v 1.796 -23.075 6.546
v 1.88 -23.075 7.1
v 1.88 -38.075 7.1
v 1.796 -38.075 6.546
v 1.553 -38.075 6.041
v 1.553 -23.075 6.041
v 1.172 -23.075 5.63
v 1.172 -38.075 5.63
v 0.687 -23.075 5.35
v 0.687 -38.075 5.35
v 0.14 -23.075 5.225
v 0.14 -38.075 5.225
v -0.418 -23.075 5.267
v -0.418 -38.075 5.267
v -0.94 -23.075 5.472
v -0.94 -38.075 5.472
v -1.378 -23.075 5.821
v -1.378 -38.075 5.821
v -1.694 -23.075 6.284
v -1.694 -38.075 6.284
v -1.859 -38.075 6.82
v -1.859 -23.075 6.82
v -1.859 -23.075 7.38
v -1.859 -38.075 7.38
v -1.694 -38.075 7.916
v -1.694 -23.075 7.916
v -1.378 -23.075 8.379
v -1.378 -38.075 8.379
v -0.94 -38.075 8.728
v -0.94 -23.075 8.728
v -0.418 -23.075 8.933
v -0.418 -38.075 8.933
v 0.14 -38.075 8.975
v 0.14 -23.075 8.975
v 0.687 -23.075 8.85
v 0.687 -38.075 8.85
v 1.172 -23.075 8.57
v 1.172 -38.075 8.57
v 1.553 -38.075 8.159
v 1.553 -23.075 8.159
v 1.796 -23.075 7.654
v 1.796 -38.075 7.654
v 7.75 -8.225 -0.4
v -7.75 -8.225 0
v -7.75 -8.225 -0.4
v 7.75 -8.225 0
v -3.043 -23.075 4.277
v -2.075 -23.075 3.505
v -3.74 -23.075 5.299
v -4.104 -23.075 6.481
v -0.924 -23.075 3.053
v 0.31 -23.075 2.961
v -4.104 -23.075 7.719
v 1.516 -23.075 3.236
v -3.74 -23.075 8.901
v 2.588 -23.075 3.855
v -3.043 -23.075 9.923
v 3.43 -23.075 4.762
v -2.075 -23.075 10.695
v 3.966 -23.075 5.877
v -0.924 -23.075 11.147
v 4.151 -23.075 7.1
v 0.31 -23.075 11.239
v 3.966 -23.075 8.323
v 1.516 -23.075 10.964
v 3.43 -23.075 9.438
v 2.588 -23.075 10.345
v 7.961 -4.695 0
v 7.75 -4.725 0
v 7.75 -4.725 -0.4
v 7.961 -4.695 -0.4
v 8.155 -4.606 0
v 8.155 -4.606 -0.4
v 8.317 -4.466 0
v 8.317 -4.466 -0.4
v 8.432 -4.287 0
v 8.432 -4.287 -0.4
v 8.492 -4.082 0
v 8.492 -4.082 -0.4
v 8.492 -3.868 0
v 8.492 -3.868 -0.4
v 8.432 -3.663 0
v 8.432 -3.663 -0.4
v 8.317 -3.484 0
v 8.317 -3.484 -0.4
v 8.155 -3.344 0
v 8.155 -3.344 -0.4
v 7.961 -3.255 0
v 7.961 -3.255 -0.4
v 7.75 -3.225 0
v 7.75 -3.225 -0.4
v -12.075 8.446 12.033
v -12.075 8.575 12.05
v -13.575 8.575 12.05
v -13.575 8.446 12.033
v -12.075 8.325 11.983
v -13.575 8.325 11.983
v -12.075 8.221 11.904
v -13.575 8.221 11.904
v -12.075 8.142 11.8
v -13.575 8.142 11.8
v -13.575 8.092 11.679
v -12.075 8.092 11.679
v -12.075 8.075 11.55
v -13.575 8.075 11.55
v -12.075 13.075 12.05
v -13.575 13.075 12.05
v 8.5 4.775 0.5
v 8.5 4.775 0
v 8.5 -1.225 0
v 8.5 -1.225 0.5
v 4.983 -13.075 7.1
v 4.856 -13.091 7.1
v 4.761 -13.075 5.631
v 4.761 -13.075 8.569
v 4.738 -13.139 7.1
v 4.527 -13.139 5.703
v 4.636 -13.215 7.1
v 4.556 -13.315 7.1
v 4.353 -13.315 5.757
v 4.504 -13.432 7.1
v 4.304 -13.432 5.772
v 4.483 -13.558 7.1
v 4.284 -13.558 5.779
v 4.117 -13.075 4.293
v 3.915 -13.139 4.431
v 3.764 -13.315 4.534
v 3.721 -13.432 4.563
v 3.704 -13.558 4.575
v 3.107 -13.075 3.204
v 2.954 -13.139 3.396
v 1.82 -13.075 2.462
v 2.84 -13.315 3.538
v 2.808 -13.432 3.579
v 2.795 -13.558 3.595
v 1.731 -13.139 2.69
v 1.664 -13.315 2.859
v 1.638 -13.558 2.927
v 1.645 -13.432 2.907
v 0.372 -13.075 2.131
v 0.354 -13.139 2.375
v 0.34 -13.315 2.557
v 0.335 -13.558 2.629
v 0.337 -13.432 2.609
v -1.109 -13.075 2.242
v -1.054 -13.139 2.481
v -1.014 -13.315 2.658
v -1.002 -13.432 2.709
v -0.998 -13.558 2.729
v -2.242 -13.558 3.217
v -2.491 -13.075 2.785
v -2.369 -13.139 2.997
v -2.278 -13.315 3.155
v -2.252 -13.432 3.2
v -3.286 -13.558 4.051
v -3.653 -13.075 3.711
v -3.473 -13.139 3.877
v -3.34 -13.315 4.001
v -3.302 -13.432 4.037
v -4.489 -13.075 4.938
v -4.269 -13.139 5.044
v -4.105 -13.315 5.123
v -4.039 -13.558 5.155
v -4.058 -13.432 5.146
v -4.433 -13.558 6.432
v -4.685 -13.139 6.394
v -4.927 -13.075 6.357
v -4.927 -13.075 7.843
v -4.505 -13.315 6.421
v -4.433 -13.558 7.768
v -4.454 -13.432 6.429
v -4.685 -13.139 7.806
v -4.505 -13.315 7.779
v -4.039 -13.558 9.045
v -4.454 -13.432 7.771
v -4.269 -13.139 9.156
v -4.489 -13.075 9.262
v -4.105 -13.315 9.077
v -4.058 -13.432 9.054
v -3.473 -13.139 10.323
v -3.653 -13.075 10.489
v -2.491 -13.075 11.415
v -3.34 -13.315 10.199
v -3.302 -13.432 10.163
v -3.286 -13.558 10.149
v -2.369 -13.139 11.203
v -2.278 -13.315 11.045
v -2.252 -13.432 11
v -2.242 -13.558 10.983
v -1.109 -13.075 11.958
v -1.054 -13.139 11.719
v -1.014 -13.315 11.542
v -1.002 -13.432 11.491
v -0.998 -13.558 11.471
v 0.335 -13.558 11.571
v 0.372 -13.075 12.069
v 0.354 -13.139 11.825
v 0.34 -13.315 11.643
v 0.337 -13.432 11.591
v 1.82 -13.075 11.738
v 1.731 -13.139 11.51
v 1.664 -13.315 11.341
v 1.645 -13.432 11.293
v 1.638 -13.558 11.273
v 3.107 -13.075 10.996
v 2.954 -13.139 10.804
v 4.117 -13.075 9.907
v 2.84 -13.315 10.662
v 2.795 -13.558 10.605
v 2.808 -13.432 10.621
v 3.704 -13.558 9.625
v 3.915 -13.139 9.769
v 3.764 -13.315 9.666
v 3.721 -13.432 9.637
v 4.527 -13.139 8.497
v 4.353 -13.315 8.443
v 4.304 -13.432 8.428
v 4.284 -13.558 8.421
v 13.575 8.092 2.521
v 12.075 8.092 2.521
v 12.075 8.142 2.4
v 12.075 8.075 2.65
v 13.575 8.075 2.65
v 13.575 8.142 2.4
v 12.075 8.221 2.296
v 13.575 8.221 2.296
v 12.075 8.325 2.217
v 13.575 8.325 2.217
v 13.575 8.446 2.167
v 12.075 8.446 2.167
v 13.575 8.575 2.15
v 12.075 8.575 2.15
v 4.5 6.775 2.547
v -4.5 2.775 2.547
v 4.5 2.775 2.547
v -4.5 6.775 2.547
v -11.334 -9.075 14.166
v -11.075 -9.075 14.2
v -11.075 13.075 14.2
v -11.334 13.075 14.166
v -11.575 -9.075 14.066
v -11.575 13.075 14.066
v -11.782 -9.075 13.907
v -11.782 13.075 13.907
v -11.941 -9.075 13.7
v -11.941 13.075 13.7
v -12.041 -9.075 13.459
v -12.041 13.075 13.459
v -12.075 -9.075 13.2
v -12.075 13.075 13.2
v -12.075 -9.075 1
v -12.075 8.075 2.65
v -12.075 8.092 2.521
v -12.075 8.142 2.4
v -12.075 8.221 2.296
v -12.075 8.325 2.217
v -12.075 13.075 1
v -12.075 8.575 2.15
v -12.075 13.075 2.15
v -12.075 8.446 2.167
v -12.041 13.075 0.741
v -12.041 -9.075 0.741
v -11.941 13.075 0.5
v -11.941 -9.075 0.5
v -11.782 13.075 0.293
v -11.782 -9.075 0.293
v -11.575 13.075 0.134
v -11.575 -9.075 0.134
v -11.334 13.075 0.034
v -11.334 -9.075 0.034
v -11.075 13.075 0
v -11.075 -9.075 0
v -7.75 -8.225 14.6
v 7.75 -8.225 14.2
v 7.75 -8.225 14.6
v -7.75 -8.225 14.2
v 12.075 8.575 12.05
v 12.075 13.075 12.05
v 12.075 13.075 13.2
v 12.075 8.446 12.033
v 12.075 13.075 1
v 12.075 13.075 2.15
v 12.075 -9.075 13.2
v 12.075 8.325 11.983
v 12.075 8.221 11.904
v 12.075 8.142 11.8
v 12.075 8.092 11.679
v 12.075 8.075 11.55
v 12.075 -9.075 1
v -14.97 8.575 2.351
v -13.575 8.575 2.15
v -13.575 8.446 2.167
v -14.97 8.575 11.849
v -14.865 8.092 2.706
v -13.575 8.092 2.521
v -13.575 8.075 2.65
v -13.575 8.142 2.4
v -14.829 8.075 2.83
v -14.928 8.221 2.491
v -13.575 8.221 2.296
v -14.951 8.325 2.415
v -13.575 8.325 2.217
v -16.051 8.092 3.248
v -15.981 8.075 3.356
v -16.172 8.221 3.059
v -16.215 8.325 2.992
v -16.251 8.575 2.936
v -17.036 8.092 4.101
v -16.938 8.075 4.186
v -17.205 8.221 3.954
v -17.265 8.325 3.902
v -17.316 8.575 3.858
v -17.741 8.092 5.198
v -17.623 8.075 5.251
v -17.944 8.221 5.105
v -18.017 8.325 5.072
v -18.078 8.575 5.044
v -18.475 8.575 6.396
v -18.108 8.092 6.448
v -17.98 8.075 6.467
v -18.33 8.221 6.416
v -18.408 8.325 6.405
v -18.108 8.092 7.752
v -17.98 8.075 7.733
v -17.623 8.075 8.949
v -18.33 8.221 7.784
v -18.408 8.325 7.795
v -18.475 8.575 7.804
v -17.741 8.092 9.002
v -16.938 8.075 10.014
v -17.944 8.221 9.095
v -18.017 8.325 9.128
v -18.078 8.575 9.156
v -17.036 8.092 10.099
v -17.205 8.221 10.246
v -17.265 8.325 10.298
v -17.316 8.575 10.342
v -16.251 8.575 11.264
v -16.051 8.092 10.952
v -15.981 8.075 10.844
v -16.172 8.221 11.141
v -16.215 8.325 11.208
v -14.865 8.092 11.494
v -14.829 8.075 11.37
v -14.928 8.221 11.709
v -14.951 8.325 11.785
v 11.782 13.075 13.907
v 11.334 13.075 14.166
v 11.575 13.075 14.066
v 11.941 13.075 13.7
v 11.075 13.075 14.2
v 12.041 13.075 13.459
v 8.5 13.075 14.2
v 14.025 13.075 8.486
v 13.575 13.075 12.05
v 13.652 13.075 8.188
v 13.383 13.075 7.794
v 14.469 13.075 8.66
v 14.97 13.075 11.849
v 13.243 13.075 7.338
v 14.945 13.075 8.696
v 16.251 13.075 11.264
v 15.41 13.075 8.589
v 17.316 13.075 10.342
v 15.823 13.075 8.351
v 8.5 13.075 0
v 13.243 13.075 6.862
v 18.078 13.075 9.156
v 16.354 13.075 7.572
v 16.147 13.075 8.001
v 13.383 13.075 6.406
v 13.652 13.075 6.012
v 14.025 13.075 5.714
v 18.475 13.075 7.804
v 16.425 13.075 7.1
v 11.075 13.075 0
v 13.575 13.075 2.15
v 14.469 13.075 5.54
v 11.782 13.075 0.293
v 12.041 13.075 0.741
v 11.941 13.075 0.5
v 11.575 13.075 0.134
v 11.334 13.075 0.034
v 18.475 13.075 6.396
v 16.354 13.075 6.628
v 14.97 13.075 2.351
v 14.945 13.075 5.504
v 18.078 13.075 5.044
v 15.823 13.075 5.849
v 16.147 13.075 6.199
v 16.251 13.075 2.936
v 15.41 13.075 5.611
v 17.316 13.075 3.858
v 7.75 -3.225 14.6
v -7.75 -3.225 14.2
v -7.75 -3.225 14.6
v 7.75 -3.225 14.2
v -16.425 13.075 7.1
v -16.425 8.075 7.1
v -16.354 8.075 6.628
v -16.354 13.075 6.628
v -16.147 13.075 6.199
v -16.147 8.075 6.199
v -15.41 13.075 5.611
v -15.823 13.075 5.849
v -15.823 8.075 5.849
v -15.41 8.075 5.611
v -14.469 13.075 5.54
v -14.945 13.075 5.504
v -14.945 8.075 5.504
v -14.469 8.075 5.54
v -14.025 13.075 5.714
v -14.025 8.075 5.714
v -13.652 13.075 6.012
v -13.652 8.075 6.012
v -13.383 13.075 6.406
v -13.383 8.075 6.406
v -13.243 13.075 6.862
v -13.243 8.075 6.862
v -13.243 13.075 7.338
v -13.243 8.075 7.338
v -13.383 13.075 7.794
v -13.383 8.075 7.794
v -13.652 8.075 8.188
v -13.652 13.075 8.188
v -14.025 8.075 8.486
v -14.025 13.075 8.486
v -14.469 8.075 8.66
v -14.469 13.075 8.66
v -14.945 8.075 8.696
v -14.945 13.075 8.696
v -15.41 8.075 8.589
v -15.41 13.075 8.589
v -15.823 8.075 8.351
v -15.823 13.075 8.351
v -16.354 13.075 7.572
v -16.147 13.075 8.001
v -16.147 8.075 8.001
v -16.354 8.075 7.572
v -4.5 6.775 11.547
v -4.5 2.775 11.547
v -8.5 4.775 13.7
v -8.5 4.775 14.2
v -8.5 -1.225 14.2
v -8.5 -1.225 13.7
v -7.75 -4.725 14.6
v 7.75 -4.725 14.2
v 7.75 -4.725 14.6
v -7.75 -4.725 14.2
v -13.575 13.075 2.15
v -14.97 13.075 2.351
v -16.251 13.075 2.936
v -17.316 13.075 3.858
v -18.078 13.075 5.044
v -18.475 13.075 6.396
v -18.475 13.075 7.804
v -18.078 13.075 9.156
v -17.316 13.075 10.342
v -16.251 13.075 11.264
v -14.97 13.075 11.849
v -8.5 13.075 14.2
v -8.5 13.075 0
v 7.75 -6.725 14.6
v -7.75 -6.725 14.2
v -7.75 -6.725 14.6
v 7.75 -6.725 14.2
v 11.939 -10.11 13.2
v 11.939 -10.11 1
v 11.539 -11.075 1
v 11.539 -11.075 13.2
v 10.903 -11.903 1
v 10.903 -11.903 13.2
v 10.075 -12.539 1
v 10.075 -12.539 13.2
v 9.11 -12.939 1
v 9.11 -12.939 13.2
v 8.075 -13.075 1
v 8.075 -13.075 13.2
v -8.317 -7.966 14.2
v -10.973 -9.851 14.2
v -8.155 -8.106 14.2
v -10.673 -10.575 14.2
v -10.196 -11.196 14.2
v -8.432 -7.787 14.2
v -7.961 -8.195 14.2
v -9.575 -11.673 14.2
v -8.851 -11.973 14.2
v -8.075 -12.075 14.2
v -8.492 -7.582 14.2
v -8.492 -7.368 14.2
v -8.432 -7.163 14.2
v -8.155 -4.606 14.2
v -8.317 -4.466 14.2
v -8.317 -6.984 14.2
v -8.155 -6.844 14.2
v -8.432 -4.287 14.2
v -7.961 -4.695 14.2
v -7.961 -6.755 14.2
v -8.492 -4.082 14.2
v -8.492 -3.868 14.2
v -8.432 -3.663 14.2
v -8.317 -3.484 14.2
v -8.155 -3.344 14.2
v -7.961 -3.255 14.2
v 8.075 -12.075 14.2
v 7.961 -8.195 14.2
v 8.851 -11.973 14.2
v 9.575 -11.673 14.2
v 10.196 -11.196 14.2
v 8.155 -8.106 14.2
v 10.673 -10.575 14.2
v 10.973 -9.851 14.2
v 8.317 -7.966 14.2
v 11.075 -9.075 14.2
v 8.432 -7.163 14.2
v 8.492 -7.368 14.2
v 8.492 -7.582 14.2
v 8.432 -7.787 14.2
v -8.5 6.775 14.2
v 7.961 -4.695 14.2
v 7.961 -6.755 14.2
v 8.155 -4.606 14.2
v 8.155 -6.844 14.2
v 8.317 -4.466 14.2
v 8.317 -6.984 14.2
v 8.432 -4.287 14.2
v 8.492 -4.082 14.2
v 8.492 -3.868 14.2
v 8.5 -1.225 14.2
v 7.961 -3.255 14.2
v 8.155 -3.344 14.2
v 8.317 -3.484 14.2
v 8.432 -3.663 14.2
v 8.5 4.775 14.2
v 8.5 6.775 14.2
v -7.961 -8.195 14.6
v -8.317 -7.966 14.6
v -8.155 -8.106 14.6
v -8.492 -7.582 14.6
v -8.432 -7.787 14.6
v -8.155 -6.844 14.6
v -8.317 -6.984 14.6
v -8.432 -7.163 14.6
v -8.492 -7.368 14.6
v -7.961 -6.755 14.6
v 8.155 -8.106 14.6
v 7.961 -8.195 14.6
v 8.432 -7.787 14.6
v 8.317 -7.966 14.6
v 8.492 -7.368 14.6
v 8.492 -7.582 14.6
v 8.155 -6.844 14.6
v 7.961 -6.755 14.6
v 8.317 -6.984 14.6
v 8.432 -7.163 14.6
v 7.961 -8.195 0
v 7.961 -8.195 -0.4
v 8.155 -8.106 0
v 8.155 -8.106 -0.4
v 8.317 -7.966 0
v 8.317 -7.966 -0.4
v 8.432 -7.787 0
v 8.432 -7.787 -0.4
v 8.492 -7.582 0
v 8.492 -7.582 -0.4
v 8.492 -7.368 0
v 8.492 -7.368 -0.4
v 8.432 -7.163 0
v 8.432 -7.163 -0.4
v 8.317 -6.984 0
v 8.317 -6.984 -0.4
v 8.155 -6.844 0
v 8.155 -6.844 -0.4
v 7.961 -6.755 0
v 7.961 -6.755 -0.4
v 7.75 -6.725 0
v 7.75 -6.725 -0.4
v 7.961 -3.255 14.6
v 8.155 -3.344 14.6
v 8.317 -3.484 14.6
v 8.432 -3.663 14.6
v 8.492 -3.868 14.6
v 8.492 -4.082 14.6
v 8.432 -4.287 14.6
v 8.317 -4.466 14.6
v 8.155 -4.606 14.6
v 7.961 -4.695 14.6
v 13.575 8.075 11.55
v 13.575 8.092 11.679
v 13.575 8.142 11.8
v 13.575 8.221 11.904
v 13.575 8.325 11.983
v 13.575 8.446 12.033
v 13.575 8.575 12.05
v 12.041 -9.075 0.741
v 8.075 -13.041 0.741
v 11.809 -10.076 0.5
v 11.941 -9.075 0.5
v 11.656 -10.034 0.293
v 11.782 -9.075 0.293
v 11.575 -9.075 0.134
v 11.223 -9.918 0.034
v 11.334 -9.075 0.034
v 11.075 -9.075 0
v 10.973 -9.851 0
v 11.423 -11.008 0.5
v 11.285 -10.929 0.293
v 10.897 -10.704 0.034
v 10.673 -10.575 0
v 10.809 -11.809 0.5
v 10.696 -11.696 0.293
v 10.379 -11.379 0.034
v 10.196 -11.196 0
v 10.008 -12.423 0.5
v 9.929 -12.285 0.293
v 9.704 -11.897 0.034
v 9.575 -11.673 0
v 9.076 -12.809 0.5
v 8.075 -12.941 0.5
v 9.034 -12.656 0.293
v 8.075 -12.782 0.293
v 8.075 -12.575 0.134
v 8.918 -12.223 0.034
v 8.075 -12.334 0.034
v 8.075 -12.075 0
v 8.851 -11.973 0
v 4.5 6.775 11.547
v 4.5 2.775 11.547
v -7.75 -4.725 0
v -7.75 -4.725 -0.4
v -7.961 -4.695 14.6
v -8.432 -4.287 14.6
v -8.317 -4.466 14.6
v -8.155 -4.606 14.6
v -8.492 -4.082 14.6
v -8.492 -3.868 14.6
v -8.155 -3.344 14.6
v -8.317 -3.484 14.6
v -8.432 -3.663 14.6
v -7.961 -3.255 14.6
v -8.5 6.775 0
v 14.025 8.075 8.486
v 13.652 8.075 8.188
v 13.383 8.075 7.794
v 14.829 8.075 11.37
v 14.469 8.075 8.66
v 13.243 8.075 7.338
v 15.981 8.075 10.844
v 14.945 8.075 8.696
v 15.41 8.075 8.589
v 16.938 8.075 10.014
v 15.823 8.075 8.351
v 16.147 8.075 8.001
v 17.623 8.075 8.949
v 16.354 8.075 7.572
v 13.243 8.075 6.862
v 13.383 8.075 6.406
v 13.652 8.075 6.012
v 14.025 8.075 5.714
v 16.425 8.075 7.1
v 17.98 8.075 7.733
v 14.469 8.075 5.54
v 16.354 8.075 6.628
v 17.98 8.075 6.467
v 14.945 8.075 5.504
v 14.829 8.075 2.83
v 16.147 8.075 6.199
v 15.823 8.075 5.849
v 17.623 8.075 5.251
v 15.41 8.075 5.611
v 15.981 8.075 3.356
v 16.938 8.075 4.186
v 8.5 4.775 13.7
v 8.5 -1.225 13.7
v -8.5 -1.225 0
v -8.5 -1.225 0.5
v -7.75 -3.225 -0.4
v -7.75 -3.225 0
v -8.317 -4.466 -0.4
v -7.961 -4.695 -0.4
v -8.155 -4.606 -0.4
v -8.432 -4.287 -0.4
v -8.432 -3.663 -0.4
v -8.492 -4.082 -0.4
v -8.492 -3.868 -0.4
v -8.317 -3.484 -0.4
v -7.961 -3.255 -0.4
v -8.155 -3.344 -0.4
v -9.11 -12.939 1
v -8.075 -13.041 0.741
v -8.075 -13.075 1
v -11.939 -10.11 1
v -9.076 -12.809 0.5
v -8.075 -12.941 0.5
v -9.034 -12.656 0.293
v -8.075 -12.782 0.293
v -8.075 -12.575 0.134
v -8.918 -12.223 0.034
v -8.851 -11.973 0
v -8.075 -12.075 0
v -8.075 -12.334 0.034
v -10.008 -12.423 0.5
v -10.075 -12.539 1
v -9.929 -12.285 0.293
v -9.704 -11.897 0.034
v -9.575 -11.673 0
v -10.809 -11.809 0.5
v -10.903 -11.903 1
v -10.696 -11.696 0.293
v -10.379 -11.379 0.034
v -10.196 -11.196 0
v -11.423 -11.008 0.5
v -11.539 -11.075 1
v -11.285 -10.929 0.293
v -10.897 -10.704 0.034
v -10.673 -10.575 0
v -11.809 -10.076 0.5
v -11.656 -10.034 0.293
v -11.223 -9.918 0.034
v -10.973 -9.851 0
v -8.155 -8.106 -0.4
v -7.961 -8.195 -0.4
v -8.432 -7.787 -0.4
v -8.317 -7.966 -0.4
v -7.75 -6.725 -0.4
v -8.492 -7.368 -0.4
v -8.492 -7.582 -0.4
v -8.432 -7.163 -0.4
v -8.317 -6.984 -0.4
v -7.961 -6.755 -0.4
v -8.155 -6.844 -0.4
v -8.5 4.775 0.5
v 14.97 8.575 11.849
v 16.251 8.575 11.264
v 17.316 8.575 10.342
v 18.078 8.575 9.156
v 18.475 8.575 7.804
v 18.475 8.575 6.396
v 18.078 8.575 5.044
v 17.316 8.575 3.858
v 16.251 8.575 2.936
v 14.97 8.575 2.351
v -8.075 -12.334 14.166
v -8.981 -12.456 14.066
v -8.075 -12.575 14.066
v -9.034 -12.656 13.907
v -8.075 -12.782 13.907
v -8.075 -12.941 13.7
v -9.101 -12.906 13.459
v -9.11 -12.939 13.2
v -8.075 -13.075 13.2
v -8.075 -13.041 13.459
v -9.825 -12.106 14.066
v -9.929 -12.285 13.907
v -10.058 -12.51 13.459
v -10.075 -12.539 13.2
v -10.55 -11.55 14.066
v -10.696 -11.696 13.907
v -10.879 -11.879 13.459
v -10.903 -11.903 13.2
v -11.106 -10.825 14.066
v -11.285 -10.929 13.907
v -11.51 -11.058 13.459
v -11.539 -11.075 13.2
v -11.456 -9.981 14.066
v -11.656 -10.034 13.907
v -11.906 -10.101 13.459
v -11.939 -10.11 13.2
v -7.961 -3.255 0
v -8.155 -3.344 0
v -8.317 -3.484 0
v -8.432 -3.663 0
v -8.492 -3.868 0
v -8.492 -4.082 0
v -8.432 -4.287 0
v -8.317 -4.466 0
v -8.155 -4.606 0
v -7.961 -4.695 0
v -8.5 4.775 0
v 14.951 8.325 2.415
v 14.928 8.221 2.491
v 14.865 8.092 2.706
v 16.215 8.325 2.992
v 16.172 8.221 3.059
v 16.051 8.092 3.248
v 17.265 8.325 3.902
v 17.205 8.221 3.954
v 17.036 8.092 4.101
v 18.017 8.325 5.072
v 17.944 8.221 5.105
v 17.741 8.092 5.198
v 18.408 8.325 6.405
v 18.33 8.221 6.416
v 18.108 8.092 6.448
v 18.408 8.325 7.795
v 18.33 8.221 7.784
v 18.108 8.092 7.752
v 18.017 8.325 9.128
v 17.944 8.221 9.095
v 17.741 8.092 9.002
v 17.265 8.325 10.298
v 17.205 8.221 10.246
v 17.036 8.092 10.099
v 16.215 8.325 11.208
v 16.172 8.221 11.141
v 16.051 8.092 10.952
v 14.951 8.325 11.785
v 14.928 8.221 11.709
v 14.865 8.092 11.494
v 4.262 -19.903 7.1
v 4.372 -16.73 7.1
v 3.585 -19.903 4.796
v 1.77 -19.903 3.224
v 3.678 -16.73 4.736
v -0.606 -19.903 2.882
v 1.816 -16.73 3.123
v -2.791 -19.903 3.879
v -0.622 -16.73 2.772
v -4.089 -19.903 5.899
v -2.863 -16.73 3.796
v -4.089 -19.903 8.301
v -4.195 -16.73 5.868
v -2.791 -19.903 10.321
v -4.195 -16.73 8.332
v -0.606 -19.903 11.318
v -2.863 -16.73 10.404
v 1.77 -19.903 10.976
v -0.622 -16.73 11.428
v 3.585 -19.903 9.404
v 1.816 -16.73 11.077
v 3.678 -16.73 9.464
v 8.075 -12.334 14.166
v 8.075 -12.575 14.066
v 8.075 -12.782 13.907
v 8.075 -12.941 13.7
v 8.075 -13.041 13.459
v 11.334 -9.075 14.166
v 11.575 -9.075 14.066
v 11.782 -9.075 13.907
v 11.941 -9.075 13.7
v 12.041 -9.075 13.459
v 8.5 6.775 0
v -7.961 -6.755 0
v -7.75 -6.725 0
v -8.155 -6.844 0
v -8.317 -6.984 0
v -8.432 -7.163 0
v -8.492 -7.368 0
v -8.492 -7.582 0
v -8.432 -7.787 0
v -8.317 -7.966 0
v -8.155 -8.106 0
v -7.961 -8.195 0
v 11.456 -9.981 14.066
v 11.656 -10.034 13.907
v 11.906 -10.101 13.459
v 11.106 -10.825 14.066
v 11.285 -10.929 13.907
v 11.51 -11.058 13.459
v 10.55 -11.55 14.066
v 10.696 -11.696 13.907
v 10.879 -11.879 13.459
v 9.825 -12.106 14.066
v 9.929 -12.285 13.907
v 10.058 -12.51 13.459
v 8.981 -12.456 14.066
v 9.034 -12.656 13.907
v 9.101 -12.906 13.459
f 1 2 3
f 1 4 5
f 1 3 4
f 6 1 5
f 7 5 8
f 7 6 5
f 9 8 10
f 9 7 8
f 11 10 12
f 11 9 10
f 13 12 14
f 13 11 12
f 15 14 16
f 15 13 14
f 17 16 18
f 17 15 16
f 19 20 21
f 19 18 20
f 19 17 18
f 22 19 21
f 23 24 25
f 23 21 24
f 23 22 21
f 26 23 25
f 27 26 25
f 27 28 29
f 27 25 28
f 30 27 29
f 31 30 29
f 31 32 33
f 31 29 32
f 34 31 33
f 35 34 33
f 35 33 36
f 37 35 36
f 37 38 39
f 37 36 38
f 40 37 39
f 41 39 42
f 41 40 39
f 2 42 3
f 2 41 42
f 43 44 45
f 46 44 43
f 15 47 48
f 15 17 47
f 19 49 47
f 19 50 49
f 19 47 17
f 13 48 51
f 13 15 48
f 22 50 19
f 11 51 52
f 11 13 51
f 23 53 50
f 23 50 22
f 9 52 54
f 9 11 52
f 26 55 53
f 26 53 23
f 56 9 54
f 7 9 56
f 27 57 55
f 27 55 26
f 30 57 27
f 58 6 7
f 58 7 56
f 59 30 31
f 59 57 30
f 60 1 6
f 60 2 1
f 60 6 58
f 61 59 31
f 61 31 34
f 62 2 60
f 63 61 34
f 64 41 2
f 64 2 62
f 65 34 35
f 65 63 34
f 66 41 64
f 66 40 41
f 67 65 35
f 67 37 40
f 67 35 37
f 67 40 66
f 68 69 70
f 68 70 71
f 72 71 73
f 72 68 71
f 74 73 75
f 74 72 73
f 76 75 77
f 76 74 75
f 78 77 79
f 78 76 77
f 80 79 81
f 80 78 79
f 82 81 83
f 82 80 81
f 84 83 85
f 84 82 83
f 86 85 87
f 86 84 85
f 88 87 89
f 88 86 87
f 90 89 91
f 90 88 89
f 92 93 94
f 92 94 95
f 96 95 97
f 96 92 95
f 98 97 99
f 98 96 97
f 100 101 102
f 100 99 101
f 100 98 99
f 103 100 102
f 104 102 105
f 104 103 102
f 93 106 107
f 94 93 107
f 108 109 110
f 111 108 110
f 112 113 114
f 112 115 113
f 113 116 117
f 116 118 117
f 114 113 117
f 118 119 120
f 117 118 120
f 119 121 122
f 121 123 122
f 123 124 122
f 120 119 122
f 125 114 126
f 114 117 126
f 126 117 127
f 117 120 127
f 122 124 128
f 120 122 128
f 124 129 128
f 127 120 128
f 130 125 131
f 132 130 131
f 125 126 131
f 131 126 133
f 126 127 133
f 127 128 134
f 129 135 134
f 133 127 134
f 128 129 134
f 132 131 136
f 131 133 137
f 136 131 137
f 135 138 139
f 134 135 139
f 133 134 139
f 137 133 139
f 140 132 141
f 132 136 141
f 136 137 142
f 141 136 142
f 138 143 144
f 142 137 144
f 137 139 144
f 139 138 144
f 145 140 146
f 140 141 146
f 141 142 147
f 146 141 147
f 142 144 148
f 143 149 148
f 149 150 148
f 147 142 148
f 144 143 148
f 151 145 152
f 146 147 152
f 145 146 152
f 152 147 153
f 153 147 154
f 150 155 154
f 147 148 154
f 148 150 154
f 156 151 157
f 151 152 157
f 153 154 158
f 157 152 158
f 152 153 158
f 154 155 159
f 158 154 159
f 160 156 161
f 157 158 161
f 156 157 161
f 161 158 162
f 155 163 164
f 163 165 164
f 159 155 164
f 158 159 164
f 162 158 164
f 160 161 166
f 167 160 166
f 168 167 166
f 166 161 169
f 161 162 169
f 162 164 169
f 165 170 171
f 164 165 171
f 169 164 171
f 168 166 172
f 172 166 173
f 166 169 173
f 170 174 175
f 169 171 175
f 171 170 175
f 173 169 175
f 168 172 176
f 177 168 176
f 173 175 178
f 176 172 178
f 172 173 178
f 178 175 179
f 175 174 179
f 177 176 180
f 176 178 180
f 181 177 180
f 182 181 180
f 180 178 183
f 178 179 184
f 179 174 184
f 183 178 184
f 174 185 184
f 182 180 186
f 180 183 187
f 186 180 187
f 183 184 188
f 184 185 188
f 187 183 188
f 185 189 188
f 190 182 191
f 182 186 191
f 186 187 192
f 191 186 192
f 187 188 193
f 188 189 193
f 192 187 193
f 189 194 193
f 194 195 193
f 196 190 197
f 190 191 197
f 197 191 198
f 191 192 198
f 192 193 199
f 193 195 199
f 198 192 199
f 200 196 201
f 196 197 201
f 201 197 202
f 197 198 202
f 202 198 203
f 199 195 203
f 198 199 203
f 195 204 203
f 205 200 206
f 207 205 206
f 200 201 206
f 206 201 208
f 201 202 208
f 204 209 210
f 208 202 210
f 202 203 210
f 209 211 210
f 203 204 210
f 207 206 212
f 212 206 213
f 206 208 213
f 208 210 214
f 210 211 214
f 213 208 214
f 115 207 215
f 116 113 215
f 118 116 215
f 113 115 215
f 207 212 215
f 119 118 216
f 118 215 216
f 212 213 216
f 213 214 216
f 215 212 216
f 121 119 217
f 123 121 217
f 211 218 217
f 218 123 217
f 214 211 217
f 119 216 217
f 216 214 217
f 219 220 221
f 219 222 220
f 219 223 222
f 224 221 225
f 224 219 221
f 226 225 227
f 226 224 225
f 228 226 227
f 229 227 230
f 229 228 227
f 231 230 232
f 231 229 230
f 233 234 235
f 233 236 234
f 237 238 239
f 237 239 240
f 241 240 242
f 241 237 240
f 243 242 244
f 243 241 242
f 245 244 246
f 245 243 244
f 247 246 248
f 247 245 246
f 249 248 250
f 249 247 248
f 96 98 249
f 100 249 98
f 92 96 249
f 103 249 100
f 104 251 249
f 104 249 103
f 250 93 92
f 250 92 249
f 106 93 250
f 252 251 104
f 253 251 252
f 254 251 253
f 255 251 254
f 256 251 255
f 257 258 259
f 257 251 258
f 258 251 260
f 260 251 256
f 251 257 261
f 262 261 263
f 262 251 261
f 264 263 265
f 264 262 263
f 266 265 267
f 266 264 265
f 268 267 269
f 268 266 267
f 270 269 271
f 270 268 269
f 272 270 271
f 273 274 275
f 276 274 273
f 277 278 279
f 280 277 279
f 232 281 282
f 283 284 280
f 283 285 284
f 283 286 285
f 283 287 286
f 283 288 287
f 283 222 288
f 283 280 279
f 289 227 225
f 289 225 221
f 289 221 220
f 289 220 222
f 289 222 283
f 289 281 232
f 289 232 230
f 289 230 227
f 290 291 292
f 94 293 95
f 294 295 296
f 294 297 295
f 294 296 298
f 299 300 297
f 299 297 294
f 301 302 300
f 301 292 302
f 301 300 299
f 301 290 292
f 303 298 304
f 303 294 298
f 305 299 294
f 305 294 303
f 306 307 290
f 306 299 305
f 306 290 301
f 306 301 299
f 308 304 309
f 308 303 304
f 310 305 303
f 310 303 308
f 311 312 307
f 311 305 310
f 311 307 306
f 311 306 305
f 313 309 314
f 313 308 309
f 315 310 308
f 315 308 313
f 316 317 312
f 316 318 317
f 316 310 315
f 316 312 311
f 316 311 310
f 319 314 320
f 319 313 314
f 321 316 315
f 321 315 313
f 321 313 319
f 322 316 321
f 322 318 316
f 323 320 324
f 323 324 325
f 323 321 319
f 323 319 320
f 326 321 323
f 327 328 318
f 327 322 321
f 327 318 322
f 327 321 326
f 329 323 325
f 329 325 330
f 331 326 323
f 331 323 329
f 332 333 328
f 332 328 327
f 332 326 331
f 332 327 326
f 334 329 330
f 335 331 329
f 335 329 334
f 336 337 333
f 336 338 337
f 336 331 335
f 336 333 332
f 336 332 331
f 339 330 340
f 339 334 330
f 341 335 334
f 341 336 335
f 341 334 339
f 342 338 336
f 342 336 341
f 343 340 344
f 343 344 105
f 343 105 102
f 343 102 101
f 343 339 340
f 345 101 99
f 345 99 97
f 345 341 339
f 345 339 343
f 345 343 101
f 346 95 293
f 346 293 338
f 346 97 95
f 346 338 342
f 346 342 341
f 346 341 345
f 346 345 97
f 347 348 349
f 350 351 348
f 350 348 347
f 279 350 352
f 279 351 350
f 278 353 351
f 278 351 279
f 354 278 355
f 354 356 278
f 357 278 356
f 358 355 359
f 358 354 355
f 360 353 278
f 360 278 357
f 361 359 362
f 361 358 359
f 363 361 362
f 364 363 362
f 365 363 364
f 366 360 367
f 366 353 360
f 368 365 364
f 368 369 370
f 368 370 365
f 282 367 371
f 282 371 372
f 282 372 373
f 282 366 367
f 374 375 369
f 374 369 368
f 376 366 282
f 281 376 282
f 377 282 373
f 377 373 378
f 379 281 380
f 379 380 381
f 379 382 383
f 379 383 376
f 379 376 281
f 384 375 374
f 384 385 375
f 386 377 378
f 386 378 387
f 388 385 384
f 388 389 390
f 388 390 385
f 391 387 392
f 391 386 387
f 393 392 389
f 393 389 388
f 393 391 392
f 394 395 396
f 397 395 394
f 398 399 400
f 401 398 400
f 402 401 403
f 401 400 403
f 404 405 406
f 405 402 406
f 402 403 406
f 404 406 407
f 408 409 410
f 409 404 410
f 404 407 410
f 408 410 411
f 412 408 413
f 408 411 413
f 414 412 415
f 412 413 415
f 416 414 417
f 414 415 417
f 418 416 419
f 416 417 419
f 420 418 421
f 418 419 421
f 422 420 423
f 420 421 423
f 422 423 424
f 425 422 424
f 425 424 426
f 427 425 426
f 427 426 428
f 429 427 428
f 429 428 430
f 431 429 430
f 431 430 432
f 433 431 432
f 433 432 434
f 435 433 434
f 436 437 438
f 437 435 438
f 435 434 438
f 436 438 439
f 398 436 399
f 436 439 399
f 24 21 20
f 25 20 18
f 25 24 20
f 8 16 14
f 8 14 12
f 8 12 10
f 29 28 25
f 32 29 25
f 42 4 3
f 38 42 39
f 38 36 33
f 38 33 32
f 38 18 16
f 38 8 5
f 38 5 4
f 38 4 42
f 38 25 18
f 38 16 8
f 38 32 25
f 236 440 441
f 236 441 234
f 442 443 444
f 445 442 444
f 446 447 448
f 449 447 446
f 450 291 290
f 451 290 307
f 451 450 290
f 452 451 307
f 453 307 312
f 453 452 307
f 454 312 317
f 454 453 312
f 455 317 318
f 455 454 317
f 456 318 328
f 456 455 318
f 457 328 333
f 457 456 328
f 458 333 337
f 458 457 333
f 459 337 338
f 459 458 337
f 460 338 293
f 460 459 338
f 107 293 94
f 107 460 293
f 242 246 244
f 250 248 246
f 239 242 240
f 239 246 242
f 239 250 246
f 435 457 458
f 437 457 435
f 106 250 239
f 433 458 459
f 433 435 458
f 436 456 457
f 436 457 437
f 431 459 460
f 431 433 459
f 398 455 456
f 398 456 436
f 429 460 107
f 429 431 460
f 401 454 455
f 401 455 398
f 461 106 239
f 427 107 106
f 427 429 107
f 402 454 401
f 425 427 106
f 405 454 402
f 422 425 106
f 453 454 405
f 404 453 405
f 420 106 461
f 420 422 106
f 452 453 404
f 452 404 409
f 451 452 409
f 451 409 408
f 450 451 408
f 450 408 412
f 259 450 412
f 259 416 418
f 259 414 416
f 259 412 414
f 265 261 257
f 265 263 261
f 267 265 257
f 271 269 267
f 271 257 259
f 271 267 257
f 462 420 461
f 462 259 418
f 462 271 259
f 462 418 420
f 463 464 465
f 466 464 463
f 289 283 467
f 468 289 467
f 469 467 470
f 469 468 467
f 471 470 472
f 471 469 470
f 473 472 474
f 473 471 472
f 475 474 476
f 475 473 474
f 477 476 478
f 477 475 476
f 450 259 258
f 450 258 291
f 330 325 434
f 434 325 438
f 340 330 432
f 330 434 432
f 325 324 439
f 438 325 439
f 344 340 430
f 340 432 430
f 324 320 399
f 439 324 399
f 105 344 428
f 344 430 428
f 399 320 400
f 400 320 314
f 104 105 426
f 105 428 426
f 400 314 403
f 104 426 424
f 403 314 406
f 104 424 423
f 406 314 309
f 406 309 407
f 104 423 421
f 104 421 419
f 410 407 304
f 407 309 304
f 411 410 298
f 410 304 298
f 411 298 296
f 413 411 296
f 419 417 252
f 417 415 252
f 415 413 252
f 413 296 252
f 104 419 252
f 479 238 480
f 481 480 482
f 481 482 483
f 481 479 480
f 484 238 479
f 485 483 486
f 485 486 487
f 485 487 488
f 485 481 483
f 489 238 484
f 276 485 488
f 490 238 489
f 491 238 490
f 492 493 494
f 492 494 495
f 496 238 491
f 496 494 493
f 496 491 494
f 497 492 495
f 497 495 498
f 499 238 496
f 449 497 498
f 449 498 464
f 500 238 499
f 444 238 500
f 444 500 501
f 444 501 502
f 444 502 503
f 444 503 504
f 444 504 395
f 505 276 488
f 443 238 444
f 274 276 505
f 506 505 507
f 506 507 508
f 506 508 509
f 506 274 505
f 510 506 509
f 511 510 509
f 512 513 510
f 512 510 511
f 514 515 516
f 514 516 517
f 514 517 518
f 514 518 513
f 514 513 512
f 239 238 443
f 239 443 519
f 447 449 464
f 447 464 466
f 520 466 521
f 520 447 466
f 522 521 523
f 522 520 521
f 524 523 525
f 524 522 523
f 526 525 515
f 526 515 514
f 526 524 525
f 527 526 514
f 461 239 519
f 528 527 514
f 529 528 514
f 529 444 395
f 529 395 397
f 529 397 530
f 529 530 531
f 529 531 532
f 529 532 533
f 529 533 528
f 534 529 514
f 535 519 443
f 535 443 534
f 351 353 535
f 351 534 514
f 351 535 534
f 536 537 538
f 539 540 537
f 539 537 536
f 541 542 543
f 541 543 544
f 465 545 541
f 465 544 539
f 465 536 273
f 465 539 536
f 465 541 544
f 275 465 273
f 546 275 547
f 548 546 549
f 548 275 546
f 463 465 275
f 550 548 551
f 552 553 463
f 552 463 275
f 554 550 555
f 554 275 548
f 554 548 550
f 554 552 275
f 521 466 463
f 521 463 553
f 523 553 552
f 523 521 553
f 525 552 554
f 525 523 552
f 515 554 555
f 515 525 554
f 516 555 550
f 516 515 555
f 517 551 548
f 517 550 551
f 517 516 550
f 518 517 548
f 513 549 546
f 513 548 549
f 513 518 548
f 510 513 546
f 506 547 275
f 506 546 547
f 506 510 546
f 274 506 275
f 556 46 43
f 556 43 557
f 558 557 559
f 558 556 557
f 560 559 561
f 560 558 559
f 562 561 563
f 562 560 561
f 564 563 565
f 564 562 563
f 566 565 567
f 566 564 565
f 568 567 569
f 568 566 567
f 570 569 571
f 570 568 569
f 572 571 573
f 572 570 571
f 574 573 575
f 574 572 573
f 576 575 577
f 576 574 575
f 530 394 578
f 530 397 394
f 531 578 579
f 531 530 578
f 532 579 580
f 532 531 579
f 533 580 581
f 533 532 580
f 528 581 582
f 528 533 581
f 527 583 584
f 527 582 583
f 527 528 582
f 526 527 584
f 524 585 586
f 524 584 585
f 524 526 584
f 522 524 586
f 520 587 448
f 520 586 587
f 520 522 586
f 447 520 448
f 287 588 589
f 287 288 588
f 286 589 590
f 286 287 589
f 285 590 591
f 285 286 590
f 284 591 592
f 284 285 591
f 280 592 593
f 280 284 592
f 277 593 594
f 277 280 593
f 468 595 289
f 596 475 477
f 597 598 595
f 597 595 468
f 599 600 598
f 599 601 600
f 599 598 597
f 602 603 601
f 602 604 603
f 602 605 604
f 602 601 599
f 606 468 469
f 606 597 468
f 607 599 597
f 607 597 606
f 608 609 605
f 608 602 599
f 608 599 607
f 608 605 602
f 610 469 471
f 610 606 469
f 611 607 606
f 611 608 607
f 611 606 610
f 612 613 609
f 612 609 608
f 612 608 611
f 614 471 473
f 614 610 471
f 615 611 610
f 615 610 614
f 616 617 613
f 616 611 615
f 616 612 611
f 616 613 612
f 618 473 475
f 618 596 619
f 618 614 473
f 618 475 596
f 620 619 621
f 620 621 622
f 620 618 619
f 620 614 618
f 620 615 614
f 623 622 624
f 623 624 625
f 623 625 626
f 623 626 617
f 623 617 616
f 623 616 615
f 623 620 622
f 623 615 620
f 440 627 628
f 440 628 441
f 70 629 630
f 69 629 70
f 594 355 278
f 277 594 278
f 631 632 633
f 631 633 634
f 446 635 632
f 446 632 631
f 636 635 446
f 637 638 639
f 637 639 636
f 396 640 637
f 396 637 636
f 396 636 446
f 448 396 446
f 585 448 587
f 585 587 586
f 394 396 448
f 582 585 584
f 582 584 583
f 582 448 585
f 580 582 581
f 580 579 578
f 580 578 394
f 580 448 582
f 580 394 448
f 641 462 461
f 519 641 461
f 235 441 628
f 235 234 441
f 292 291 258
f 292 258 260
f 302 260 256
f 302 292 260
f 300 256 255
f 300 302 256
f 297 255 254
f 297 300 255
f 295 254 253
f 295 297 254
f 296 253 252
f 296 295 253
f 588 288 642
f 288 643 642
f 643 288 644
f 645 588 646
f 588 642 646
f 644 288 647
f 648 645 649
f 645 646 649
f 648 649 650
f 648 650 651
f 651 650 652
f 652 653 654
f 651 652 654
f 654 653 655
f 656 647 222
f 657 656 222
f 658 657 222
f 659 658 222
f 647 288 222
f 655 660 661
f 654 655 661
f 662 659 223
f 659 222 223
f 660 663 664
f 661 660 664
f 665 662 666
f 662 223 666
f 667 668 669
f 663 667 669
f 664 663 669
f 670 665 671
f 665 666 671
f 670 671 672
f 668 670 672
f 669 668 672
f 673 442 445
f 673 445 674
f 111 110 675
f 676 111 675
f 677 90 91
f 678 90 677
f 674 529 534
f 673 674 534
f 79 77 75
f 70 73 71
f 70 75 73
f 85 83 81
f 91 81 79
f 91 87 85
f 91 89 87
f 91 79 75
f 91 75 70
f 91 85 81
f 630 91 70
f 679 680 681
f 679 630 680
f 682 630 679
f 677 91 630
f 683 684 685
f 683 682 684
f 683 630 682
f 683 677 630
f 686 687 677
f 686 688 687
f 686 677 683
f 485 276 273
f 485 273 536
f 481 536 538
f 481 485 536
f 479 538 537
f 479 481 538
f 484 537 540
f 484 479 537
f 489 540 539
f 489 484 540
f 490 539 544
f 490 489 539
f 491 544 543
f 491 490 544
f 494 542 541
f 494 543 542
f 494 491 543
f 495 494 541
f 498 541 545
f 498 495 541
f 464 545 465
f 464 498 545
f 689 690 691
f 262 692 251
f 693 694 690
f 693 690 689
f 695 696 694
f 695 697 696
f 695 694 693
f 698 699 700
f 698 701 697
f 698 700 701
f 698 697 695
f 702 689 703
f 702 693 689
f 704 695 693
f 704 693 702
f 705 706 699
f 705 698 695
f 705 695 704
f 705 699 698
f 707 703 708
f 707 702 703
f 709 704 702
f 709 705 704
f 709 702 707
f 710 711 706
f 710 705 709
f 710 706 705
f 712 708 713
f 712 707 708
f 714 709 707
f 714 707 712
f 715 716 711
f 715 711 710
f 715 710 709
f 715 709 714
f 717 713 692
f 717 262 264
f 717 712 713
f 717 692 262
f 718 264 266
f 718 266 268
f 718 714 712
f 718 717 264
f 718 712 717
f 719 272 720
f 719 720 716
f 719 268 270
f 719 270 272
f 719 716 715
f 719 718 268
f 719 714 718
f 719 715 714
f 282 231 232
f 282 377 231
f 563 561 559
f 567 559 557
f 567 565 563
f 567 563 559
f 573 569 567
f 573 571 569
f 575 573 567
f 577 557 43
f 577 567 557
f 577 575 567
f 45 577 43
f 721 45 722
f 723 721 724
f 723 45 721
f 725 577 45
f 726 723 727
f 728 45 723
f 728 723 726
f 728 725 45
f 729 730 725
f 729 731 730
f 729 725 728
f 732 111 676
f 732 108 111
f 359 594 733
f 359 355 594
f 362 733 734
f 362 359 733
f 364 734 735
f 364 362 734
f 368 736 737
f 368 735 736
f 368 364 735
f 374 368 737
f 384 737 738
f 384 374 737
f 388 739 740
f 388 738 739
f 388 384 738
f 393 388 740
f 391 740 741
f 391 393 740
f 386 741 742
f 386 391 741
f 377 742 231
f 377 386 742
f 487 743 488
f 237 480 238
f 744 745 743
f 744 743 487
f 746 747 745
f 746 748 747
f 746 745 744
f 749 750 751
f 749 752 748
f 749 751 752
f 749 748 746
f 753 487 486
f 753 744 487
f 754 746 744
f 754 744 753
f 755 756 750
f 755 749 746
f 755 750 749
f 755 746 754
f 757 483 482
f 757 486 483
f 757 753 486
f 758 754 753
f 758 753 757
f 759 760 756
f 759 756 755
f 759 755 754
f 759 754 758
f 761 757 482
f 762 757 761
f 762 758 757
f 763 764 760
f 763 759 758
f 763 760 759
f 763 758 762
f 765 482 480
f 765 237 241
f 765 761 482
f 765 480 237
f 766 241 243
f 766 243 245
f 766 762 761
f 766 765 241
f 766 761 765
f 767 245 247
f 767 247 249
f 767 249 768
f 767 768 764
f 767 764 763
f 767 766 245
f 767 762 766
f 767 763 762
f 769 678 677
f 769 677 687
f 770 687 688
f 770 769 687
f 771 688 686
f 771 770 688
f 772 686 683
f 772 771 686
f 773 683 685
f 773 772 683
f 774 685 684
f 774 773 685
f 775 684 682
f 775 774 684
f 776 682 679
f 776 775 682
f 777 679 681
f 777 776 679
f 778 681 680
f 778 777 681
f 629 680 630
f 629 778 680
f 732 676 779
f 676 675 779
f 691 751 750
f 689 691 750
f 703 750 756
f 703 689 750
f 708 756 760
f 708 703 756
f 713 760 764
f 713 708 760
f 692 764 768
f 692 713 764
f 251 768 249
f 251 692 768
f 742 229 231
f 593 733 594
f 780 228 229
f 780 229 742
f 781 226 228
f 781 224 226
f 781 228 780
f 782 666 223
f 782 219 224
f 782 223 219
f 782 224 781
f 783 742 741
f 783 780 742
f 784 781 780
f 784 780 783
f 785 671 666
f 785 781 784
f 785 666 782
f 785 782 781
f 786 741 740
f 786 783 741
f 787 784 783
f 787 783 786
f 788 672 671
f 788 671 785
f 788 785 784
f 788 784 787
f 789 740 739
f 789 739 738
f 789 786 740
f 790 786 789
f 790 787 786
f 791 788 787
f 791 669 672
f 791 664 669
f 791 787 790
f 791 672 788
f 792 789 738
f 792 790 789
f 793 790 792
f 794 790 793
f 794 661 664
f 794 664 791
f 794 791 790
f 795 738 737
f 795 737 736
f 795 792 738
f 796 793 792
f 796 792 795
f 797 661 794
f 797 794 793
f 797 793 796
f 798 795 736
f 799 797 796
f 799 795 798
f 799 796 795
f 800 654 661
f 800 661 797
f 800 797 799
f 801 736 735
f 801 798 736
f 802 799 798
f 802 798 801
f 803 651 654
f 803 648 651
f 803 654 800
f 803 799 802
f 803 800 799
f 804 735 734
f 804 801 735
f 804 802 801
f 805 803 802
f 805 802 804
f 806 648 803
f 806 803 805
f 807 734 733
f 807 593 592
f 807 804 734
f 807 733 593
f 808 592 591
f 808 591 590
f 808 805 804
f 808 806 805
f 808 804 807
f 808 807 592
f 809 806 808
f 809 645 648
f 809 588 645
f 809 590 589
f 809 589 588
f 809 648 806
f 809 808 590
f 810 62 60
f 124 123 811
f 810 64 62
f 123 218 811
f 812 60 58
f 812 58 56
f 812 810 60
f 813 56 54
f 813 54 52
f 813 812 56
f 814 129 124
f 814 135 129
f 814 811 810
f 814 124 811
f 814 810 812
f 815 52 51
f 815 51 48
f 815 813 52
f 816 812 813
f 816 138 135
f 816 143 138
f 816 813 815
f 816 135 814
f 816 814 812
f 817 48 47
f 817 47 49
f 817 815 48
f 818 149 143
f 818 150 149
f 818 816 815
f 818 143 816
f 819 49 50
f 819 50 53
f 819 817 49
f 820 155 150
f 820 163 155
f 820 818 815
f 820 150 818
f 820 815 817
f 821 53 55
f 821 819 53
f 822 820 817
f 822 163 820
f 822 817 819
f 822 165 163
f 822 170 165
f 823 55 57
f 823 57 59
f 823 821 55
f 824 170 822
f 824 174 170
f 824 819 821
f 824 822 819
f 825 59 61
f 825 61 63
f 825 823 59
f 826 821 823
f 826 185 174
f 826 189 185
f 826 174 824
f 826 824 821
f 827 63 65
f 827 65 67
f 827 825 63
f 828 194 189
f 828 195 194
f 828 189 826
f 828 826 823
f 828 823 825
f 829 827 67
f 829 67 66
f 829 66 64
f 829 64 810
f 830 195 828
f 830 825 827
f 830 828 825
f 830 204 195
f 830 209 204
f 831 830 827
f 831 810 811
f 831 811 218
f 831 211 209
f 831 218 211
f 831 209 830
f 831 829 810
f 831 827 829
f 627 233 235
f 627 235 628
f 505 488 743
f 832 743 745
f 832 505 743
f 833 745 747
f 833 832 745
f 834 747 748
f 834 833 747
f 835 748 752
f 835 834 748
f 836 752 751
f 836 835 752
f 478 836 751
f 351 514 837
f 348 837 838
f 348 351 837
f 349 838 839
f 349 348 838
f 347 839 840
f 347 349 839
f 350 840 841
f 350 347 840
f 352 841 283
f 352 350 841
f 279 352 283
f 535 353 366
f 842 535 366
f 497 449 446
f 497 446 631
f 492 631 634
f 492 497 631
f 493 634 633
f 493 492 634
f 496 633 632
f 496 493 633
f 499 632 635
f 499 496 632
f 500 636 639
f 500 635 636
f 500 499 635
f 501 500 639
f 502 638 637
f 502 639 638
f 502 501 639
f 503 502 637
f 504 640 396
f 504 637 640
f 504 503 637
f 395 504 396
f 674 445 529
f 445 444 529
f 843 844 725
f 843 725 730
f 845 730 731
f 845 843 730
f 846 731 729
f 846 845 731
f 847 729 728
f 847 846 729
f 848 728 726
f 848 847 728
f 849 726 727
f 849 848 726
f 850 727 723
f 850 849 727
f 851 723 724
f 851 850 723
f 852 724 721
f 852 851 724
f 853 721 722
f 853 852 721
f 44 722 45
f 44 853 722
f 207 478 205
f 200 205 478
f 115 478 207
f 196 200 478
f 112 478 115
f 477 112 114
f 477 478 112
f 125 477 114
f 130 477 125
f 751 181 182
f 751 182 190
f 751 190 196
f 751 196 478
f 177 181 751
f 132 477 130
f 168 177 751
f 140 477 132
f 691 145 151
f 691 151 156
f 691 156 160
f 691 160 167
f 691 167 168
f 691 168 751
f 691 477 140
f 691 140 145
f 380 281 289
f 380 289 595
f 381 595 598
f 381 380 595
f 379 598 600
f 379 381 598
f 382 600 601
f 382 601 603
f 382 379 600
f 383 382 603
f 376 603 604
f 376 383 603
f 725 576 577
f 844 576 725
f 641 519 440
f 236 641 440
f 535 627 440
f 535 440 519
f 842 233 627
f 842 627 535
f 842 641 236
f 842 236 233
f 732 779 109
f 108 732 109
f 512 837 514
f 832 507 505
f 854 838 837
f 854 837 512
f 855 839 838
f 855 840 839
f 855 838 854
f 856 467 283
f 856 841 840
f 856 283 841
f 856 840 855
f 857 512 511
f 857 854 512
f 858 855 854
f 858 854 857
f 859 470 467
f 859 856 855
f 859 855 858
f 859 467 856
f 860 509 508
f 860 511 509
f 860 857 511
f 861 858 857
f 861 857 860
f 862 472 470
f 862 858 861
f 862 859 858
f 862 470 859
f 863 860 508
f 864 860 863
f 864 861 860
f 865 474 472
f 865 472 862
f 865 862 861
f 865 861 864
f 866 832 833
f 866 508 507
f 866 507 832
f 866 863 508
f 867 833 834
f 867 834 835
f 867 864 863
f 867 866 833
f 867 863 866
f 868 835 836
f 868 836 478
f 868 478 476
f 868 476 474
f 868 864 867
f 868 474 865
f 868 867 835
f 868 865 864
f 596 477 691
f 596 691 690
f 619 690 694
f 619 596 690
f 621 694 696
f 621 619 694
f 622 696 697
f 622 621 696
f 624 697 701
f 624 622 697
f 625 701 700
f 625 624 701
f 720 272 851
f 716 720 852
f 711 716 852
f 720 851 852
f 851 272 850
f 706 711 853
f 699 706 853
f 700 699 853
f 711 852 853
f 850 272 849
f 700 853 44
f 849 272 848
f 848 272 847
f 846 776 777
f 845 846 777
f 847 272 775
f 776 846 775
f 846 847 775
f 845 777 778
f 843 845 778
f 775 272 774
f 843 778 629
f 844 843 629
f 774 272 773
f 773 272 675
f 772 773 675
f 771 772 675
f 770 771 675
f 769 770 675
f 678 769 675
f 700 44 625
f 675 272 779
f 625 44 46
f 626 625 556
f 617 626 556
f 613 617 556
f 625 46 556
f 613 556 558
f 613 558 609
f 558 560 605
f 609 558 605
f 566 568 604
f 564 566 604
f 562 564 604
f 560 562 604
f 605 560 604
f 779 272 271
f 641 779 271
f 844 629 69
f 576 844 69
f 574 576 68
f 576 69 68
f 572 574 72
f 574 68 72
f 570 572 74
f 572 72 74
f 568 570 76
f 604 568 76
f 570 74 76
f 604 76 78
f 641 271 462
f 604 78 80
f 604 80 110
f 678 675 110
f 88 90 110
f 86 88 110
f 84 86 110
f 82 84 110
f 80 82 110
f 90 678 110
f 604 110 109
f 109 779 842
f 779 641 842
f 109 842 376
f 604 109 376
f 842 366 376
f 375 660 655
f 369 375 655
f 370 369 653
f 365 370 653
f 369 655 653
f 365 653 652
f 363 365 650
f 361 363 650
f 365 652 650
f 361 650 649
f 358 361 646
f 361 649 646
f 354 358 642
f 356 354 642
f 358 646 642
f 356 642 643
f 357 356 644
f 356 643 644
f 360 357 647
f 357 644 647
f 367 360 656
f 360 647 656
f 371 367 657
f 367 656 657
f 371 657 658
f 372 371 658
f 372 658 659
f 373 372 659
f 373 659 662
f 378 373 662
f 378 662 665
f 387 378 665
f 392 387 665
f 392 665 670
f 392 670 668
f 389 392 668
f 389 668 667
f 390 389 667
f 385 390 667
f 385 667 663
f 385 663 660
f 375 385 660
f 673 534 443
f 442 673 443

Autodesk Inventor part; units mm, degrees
ref_plane "YZ Plane" through (0, 0, 0) normal (1, 0, 0) x (0, 1, 0)
ref_plane "XZ Plane" through (0, 0, 0) normal (0, 1, 0) x (-1, 0, 0)
sketch "Sketch1" plane through (0, 0, 0) normal (0, 0, 1) x (1, 0, 0)
  line L0 (8.075, -13.075) -> (-8.075, -13.075)
  line L1 (-12.075, -9.075) -> (-12.075, 13.075)
  line L2 (-12.075, 13.075) -> (12.075, 13.075)
  line L3 (12.075, 13.075) -> (12.075, -9.075)
  line L4 (12.075, -13.075) -> (-12.075, 13.075) construction
  line L5 (-12.075, -13.075) -> (12.075, 13.075) construction
  arc A0 (-12.075, -9.075) -> (-8.075, -13.075) centre (-8.075, -9.075) ccw
  arc A1 (8.075, -13.075) -> (12.075, -9.075) centre (8.075, -9.075) ccw
  point P0 (0, 0)
  dimension "d0" = 24.15
  dimension "d1" = 26.15
  dimension "d2" = 4
extrude "Extrusion1" add sketch "Sketch1" along normal blind 14.2
sketch "Sketch2" plane through (-12.075, 13.075, 0) normal (0, 1, 0) x (1, 0, 0)
  line L0 (24.15, 0) -> (24.15, -14.2) construction
  line L1 (24.15, 0) -> (0, 0) construction
  line L2 (4, -14.2) -> (20.15, -14.2) construction
  line L3 (12.075, -14.2) -> (12.075, 8.7449) construction
  arc A0 (25.65, -12.05) -> (25.65, -2.15) centre (25.65, -7.1) ccw
  line L4 (24.15, 0) -> (24.15, -14.2) construction
  line L5 (24.15, -7.1) -> (-4.8998, -7.1) construction
  line L6 (30.6, -19.6482) -> (30.6, 9.5146) construction
  line L7 (25.65, -2.15) -> (24.15, -2.15)
  line L8 (25.65, -12.05) -> (24.15, -12.05)
  line L9 (24.15, -2.15) -> (24.15, -12.05)
  point P0 (12.075, 0)
  dimension "d5" = 9.9
  dimension "d6" = 6.45
extrude "Extrusion2" add sketch "Sketch2" against normal blind 5
sketch "Sketch3" plane through (-12.075, 8.075, 0) normal (0, -1, 0) x (1, 0, 0)
  line L0 (24.15, 8.6877) -> (26.9, 10.2754) construction
  line L1 (26.9, 10.2754) -> (29.65, 8.6877) construction
  line L2 (29.65, 8.6877) -> (29.65, 5.5123) construction
  line L3 (29.65, 5.5123) -> (26.9, 3.9246) construction
  line L4 (26.9, 3.9246) -> (24.15, 5.5123) construction
  line L5 (24.15, 5.5123) -> (24.15, 8.6877) construction
  line L6 (24.15, 2.15) -> (24.15, 12.05) construction
  arc A0 (25.65, 2.15) -> (25.65, 12.05) centre (25.65, 7.1) ccw construction
  line L7 (25.65, 7.1) -> (35.3892, 7.1) construction
  line L8 (26.9, 10.2754) -> (26.9, 3.9246) construction
  point P0 (12.075, 0)
  point P1 (26.9, 7.1)
  point P2 (26.9, 7.1)
  dimension "d9" = 5.5
sketch "Sketch4" plane through (-12.075, 8.075, 0) normal (0, -1, 0) x (1, 0, 0)
  circle A0 centre (26.9, 7.1) radius 1.6
  point P0 (12.075, 0)
  dimension "d10" = 3.2
extrude "Extrusion3" cut sketch "Sketch4" against normal blind 5
mirror "Mirror1" about plane through (0, 0, 0) normal (1, 0, 0) of "Extrusion2", "Extrusion3"
sketch "Sketch5" plane through (-12.075, 13.075, 0) normal (0, 1, 0) x (1, 0, 0)
  line L0 (24.15, 0) -> (0, 0) construction
  line L1 (0, 0) -> (0, -2.15) construction
  line L2 (24.15, -14.2) -> (0, -14.2) projected
  line L3 (20.575, 0) -> (3.575, 0)
  line L4 (3.575, 0) -> (3.575, -14.2)
  line L5 (3.575, -14.2) -> (20.575, -14.2)
  line L6 (20.575, -14.2) -> (20.575, 0)
  line L7 (12.075, 0) -> (12.075, -22.6768) construction
  dimension "d13" = 17
extrude "Extrusion4" cut sketch "Sketch5" against normal blind 6.3
sketch "Sketch6" plane through (-8.075, -13.075, 0) normal (0, -1, 0) x (1, 0, 0)
  circle A0 centre (8.075, 7.1) radius 4.5
  line L0 (0, 0) -> (16.15, 0) construction
  line L1 (20.15, 0) -> (20.15, 14.2) construction
  point P0 (8.075, 0)
  dimension "d16" = 9
  dimension "d17" = 7.1
  dimension "d18" = 12.075
extrude "Extrusion5" add sketch "Sketch6" along normal blind 10 draft -2
sketch "Sketch7" plane through (0, -23.075, 7.1) normal (0, -1, 0) x (1, 0, 0)
  circle A0 centre (0, 0) radius 4.1508 projected
  circle A1 centre (0, 0) radius 1.88
  point P0 (0, -7.1)
  dimension "d21" = 3.76
extrude "Extrusion6" add sketch "Sketch7" along normal blind 15 contours A1
sketch "Sketch8" plane through (-12.075, 6.775, 0) normal (0, 1, 0) x (1, 0, 0)
  line L0 (3.575, -14.2) -> (3.575, 0) construction
  line L1 (3.575, 0) -> (20.575, 0) construction
  circle A0 centre (12.075, -7.1) radius 1.88 construction
  line L2 (18.135, -12.625) -> (6.015, -12.625)
  line L3 (6.015, -12.625) -> (6.015, -1.575)
  line L4 (6.015, -1.575) -> (18.135, -1.575)
  line L5 (18.135, -1.575) -> (18.135, -12.625)
  line L6 (18.135, -12.625) -> (6.015, -1.575) construction
  line L7 (6.015, -12.625) -> (18.135, -1.575) construction
  point P0 (12.075, 0)
  dimension "d24" = 12.12
  dimension "d25" = 11.05
fillet "Fillet1" radius 1 10 edges at (-10.9034, -11.9034, 0) (0, -13.075, 0) (10.9034, -11.9034, 0) (12.075, 2, 0) (-12.075, 2, 0) (-10.9034, -11.9034, 14.2) (0, -13.075, 14.2) (10.9034, -11.9034, 14.2) (12.075, 2, 14.2) (-12.075, 2, 14.2)
sketch "Sketch9" plane through (0, 0, 0) normal (0, 0, -1) x (-1, 0, 0)
  line L0 (0, -48.305) -> (0, 23.305) construction
  line L1 (8.5, 4.775) -> (-8.5, 4.775)
  line L2 (-8.5, 4.775) -> (-8.5, -1.225)
  line L3 (-8.5, -1.225) -> (8.5, -1.225)
  line L4 (8.5, -1.225) -> (8.5, 4.775)
  line L5 (8.5, 4.775) -> (-8.5, -1.225) construction
  line L6 (-8.5, 4.775) -> (8.5, -1.225) construction
  line L7 (-8.5, 6.775) -> (8.5, 6.775) projected
  point P0 (0, 0)
  point P1 (0, 1.775)
  dimension "d27" = 17
  dimension "d28" = 6
  dimension "d29" = 2
extrude "Extrusion7" cut sketch "Sketch9" against normal blind 0.5
sketch "Sketch10" plane through (0, 0, 0) normal (0, 0, -1) x (-1, 0, 0)
  line L0 (8.5, -1.225) -> (-8.5, -1.225) construction
  line L1 (0, -48.305) -> (0, 23.305) construction
  line L2 (-7.75, -3.225) -> (7.75, -3.225)
  line L3 (8.5, -3.975) -> (8.5, -3.975)
  line L4 (7.75, -4.725) -> (-7.75, -4.725)
  line L5 (-8.5, -3.975) -> (-8.5, -3.975)
  line L6 (-8.5, -3.225) -> (8.5, -4.725) construction
  line L7 (8.5, -3.225) -> (-8.5, -4.725) construction
  line L8 (-7.75, -6.725) -> (7.75, -6.725)
  line L9 (8.5, -7.475) -> (8.5, -7.475)
  line L10 (7.75, -8.225) -> (-7.75, -8.225)
  line L11 (-8.5, -7.475) -> (-8.5, -7.475)
  line L12 (-8.5, -6.725) -> (8.5, -8.225) construction
  line L13 (8.5, -6.725) -> (-8.5, -8.225) construction
  arc A0 (7.75, -8.225) -> (8.5, -7.475) centre (7.75, -7.475) ccw
  arc A1 (8.5, -7.475) -> (7.75, -6.725) centre (7.75, -7.475) ccw
  arc A2 (-8.5, -7.475) -> (-7.75, -8.225) centre (-7.75, -7.475) ccw
  arc A3 (-7.75, -6.725) -> (-8.5, -7.475) centre (-7.75, -7.475) ccw
  arc A4 (-8.5, -3.975) -> (-7.75, -4.725) centre (-7.75, -3.975) ccw
  arc A5 (-7.75, -3.225) -> (-8.5, -3.975) centre (-7.75, -3.975) ccw
  arc A6 (8.5, -3.975) -> (7.75, -3.225) centre (7.75, -3.975) ccw
  arc A7 (7.75, -4.725) -> (8.5, -3.975) centre (7.75, -3.975) ccw
  point P0 (0, 0)
  point P1 (0, -3.975)
  point P2 (0, -7.475)
  dimension "d32" = 17
  dimension "d33" = 1.5
  dimension "d34" = 2
  dimension "d35" = 17
  dimension "d36" = 1.5
  dimension "d37" = 2
  dimension "d38" = 0.75
extrude "Extrusion8" add sketch "Sketch10" along normal blind 0.4
ref_plane "Work Plane1" through (12.075, 8.075, 7.1) normal (0, 0, -1) x (-1, 0, 0)
mirror "Mirror2" about plane through (12.075, 8.075, 7.1) normal (0, 0, -1) of "Extrusion7", "Extrusion8"
fillet "Fillet2" radius 0.5 1 edges at (-4.5, -13.075, 7.1)
fillet "Fillet3" radius 0.5 6 edges at (-12.825, 8.075, 12.05) (-12.825, 8.075, 2.15) (-18.525, 8.075, 7.1) (12.825, 8.075, 12.05) (12.825, 8.075, 2.15) (18.525, 8.075, 7.1)
sketch "Sketch11" plane through (-12.075, 6.775, 0) normal (0, 1, 0) x (1, 0, 0)
  line L0 (7.575, -2.5467) -> (16.575, -2.5467)
  line L1 (16.575, -2.5467) -> (16.575, -11.5467)
  line L2 (16.575, -11.5467) -> (7.575, -11.5467)
  line L3 (7.575, -11.5467) -> (7.575, -2.5467)
  line L4 (7.575, -2.5467) -> (16.575, -11.5467) construction
  line L5 (16.575, -2.5467) -> (7.575, -11.5467) construction
  point P0 (12.075, 0)
  point P1 (12.075, -7.0467)
  dimension "d43" = 9
  dimension "d44" = 9
extrude "Extrusion9" cut sketch "Sketch11" against normal blind 4
properties part number "USB Cable B Male to B Female 90 degrees" material "Nylon 6/6"
